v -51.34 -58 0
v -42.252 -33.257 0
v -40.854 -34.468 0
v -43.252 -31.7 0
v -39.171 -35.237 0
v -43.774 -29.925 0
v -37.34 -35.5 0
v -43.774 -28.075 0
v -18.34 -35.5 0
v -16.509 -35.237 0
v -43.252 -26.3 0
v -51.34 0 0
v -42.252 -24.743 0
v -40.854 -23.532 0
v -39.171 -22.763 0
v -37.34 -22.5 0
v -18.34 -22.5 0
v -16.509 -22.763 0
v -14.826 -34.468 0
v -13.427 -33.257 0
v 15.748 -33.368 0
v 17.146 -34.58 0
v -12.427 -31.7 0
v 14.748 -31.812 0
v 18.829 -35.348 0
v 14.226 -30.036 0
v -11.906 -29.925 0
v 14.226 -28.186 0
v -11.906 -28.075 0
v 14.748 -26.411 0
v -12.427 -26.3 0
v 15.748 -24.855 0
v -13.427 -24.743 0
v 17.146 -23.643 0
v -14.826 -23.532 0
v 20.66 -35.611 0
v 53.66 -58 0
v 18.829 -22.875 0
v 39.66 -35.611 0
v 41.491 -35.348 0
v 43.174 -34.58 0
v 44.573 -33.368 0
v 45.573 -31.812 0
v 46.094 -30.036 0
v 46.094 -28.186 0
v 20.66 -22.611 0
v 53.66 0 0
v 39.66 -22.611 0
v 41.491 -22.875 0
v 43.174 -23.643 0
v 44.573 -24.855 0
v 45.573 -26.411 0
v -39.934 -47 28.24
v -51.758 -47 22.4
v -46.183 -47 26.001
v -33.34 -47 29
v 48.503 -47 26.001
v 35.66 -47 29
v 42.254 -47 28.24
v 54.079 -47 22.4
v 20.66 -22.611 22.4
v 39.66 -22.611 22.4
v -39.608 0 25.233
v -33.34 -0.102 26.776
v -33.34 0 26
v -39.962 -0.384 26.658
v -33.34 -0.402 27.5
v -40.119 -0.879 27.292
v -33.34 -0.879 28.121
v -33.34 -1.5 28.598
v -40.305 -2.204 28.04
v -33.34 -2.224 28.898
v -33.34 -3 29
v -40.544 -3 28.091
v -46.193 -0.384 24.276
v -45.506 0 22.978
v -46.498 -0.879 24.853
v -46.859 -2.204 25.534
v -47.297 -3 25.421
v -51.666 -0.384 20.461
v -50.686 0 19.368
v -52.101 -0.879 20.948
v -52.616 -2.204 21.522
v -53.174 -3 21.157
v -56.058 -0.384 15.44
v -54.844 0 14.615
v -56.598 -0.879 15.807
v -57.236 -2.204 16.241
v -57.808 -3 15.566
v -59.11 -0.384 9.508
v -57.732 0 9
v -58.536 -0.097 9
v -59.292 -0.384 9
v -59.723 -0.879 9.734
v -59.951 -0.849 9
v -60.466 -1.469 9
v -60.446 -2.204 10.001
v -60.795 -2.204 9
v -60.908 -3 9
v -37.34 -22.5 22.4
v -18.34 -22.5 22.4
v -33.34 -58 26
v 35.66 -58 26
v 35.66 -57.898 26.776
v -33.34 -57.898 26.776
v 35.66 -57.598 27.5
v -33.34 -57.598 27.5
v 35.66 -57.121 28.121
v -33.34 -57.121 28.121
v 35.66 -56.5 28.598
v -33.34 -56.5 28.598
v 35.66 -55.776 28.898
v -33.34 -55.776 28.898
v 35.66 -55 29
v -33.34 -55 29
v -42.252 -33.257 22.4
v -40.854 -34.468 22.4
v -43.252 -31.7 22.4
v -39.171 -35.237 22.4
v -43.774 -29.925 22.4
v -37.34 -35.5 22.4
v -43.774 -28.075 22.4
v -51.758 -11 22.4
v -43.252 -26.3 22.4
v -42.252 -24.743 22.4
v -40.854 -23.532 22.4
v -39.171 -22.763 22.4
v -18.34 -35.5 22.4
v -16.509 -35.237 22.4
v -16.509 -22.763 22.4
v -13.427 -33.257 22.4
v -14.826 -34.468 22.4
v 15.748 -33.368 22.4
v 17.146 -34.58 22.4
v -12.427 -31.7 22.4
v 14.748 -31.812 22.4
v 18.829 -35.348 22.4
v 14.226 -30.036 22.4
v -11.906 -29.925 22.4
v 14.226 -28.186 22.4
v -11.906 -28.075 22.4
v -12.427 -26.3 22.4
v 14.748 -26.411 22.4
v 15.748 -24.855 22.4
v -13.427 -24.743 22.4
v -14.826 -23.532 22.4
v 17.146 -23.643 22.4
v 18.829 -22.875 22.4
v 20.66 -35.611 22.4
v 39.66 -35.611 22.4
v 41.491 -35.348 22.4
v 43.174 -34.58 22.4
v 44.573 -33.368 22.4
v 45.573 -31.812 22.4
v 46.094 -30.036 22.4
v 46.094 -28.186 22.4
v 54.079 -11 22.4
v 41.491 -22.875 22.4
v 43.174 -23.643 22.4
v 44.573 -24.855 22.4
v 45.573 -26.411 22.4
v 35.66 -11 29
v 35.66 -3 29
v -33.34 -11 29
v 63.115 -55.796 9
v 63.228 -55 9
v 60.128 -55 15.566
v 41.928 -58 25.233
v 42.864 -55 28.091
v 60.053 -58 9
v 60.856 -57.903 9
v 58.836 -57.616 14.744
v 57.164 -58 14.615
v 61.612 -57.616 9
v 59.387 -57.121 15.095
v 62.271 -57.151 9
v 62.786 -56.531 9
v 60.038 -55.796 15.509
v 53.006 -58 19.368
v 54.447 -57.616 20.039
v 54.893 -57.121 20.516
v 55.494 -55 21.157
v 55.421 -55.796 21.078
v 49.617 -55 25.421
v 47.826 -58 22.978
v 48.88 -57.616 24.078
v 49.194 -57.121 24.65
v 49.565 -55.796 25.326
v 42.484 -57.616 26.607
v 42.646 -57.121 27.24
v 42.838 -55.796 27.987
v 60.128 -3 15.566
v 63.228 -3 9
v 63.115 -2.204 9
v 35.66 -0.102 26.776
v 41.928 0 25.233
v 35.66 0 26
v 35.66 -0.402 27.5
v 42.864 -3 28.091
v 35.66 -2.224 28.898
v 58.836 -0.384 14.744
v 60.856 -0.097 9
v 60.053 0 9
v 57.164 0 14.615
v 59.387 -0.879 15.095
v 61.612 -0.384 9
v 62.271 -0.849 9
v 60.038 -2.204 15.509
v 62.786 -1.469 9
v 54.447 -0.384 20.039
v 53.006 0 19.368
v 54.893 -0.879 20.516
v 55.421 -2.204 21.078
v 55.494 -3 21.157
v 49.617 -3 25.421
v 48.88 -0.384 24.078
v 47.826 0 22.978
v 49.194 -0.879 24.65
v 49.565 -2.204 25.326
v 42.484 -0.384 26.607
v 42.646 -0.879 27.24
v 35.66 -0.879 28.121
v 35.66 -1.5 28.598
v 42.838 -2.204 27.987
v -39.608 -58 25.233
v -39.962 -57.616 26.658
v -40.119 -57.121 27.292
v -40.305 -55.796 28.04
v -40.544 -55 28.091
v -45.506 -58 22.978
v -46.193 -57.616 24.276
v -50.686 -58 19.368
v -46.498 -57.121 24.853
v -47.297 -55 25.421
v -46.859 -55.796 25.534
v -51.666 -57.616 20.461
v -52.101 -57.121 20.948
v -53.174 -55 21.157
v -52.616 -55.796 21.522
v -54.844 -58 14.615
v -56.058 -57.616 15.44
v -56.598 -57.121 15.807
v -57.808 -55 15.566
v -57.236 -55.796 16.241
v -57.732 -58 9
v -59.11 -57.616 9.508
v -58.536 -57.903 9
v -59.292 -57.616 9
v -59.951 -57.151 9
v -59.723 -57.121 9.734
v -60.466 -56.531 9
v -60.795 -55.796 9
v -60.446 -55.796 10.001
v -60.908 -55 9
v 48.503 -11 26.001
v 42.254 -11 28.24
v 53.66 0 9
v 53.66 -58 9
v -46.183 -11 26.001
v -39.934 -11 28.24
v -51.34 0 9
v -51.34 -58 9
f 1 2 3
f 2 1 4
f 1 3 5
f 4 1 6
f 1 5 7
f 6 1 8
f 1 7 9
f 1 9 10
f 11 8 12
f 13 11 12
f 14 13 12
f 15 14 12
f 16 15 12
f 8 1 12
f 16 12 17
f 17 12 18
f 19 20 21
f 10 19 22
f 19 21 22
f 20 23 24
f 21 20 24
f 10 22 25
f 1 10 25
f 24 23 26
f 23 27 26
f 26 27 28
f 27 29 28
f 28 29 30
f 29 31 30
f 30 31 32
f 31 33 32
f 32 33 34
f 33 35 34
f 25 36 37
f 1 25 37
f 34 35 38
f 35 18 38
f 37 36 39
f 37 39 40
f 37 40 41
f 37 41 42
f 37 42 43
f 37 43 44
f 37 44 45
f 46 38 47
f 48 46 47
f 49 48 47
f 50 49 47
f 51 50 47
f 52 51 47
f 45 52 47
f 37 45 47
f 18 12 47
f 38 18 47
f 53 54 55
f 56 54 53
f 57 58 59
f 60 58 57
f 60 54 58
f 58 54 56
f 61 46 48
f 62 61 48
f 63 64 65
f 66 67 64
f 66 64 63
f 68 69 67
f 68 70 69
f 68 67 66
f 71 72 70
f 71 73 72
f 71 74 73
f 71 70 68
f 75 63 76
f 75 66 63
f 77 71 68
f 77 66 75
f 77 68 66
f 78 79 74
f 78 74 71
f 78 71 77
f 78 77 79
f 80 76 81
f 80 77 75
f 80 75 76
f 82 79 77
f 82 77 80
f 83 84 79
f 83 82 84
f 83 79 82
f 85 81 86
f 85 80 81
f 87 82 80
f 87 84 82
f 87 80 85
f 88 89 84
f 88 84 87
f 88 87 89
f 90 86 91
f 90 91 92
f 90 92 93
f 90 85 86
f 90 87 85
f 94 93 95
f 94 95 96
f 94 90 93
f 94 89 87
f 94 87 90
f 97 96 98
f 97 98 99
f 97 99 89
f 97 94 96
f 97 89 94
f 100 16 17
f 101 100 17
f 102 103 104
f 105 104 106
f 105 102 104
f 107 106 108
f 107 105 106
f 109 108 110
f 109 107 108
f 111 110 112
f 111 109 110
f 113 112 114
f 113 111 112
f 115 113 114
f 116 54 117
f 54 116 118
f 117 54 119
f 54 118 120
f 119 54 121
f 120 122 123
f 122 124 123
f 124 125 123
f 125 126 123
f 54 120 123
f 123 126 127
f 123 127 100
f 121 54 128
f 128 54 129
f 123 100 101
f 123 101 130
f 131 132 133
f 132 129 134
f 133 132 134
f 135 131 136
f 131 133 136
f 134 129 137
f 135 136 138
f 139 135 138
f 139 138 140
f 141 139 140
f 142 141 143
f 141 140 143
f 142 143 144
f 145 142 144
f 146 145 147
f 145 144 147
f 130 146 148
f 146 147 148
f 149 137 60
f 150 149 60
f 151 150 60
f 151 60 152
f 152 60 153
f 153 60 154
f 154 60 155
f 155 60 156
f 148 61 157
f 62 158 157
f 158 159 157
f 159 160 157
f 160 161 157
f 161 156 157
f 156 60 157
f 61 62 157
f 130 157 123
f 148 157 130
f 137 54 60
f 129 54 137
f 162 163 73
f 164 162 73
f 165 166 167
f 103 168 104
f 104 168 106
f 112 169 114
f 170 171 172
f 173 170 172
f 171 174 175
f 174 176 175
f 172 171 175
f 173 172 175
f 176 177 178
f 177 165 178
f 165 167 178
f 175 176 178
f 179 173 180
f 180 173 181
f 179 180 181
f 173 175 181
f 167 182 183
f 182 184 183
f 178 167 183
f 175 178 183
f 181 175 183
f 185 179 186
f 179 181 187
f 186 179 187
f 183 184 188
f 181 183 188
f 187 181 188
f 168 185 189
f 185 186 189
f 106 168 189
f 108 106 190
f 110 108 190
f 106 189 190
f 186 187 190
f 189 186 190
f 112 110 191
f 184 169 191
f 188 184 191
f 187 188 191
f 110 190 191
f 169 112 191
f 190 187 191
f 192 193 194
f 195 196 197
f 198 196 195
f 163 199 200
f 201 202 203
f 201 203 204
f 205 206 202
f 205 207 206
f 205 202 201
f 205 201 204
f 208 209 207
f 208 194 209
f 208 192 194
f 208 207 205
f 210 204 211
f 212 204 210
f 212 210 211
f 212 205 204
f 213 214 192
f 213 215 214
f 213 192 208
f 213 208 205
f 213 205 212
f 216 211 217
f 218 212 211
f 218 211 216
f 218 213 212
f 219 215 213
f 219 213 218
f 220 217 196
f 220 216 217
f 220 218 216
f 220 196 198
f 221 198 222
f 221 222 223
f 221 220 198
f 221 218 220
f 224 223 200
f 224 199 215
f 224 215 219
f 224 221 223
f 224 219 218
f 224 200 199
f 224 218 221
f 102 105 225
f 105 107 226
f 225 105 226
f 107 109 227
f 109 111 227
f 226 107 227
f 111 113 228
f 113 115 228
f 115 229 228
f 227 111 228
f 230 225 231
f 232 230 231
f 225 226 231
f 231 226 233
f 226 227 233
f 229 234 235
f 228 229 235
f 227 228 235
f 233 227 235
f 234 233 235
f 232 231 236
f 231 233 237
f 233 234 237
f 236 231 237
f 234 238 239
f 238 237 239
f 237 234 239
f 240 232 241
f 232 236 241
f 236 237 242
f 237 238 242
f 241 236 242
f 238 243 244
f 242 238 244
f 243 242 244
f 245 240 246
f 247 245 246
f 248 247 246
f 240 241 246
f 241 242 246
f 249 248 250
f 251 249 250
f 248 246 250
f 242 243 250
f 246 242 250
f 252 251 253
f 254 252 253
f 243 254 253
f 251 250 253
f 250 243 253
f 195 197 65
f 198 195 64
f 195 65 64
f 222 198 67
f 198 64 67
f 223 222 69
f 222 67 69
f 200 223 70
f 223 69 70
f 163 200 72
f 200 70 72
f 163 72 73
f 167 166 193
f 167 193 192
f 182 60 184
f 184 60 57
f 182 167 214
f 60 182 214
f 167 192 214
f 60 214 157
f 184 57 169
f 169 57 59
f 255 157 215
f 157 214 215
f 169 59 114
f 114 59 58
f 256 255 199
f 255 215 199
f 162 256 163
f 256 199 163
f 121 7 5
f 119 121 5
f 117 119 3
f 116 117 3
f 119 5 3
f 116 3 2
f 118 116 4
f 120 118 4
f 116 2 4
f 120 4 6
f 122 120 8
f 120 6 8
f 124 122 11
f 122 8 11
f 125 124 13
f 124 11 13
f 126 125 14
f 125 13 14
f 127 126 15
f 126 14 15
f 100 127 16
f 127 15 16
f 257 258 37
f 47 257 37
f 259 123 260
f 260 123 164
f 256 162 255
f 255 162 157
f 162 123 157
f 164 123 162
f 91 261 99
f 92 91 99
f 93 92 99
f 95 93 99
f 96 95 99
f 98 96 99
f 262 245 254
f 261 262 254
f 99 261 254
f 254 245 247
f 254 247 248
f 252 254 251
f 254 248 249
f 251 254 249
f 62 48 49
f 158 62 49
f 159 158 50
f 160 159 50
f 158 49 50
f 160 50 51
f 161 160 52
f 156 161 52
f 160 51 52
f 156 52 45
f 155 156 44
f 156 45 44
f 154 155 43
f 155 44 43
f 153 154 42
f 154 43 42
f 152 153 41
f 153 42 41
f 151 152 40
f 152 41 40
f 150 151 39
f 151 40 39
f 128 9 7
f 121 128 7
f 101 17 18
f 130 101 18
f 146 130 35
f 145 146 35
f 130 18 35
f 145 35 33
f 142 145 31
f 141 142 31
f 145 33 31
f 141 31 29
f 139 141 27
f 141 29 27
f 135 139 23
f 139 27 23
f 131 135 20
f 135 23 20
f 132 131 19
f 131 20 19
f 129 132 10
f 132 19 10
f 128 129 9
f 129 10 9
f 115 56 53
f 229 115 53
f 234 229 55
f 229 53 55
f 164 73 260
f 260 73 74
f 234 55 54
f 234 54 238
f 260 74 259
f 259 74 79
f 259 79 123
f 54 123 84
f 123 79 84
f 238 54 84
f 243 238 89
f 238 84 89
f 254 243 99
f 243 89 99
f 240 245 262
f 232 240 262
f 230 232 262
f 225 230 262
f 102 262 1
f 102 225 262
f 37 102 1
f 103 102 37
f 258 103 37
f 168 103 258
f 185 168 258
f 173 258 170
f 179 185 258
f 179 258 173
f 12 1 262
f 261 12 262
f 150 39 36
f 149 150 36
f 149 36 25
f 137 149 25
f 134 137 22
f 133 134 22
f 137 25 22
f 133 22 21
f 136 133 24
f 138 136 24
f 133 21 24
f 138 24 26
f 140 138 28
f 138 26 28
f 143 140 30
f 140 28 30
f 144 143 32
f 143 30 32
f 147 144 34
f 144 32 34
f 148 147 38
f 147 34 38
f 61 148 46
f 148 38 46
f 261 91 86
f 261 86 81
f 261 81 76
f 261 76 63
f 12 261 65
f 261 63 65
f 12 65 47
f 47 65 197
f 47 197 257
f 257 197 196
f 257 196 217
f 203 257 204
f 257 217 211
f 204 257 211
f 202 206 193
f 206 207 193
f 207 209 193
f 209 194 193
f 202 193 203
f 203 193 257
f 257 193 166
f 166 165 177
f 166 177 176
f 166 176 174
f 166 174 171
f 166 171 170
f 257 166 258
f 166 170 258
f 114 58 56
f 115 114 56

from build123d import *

# Parameters (mm, degrees)
F1_DEPTH      = 58
F3_DEPTH      = 58.001
F4_W          = 36
F4_H          = 6.6
F5_DEPTH      = 127
F5_DEPTH_BACK = 127
F7_DEPTH      = 29.001
F8_R          = 3
F9_DEPTH      = 25


with BuildPart() as f1:
    # F0 (on Front) → F1 (new body)
    with BuildSketch(Plane.XZ):
        with BuildLine():
            ThreePointArc((-60.907962, 9), (-61.979652, 4.556598), (-62.339865, 0))
            Line((-62.339865, 0), (-51.339865, 0))
            Line((-51.339865, 0), (-51.339865, 9))
            Line((-51.339865, 9), (-60.907962, 9))
        make_face()
        with BuildLine():
            ThreePointArc((-33.339865, 29), (-50.369251, 23.473389), (-60.907962, 9))
            Line((-60.907962, 9), (-51.339865, 9))
            Line((-51.339865, 9), (-51.339865, 0))
            Line((-51.339865, 0), (53.660135, 0))
            Line((53.660135, 0), (53.660135, 9))
            Line((53.660135, 9), (63.228233, 9))
            ThreePointArc((63.228233, 9), (52.689522, 23.473389), (35.660135, 29))
            Line((35.660135, 29), (-33.339865, 29))
        make_face()
        with BuildLine():
            Line((53.660135, 9), (53.660135, 0))
            Line((53.660135, 0), (64.660135, 0))
            ThreePointArc((64.660135, 0), (64.299923, 4.556598), (63.228233, 9))
            Line((63.228233, 9), (53.660135, 9))
        make_face()
    extrude(amount=F1_DEPTH)

    # F2 (on face) → F3 (cut, through all)
    with BuildSketch(Plane.XZ.offset(58)):
        with BuildLine():
            Line((-62.339865, 0), (-51.339865, 0))
            Line((-51.339865, 0), (-51.339865, 9))
            Line((-51.339865, 9), (-60.907962, 9))
            ThreePointArc((-60.907962, 9), (-61.979652, 4.556598), (-62.339865, 0))
        make_face()
        with BuildLine():
            Line((53.660135, 9), (53.660135, 0))
            Line((53.660135, 0), (64.660135, 0))
            ThreePointArc((64.660135, 0), (64.299923, 4.556598), (63.228233, 9))
            Line((63.228233, 9), (53.660135, 9))
        make_face()
    extrude(amount=-F3_DEPTH, mode=Mode.SUBTRACT)

    # F4 (on Right) → F5 (cut, two sides)
    with BuildSketch(Plane.YZ) as f5_sk:
        with Locations((-29, 25.7)):
            Rectangle(F4_W, F4_H)
    extrude(amount=F5_DEPTH, mode=Mode.SUBTRACT)
    extrude(f5_sk.sketch, amount=-F5_DEPTH_BACK, mode=Mode.SUBTRACT)

    # F6 (on face) → F7 (cut, through all)
    with BuildSketch(Plane(origin=(0, 0, 0), x_dir=(1, 0, 0), z_dir=(0, 0, -1))):
        with BuildLine():
            ThreePointArc((-37.339865, 35.5), (-43.839865, 29), (-37.339865, 22.5))
            Line((-37.339865, 22.5), (-18.339865, 22.5))
            ThreePointArc((-18.339865, 22.5), (-11.839865, 29), (-18.339865, 35.5))
            Line((-18.339865, 35.5), (-37.339865, 35.5))
        make_face()
        with BuildLine():
            ThreePointArc((20.660135, 35.611376), (14.160135, 29.111376), (20.660135, 22.611376))
            Line((20.660135, 22.611376), (39.660135, 22.611376))
            ThreePointArc((39.660135, 22.611376), (46.160135, 29.111376), (39.660135, 35.611376))
            Line((39.660135, 35.611376), (20.660135, 35.611376))
        make_face()
    extrude(amount=-F7_DEPTH, mode=Mode.SUBTRACT)

    # F8
    f8_edges = [f1.edges().sort_by_distance(p)[0] for p in [
        (1.160135, -58, 29),
        (1.160135, 0, 29),
    ]]
    fillet(f8_edges, radius=F8_R)

    # F6 (on face) → F9 (cut)
    with BuildSketch(Plane(origin=(0, 0, 0), x_dir=(1, 0, 0), z_dir=(0, 0, -1))):
        with BuildLine():
            ThreePointArc((-37.339865, 35.5), (-43.839865, 29), (-37.339865, 22.5))
            Line((-37.339865, 22.5), (-18.339865, 22.5))
            ThreePointArc((-18.339865, 22.5), (-11.839865, 29), (-18.339865, 35.5))
            Line((-18.339865, 35.5), (-37.339865, 35.5))
        make_face()
        with BuildLine():
            ThreePointArc((20.660135, 35.611376), (14.160135, 29.111376), (20.660135, 22.611376))
            Line((20.660135, 22.611376), (39.660135, 22.611376))
            ThreePointArc((39.660135, 22.611376), (46.160135, 29.111376), (39.660135, 35.611376))
            Line((39.660135, 35.611376), (20.660135, 35.611376))
        make_face()
    extrude(amount=F9_DEPTH, mode=Mode.SUBTRACT)


solid = f1.part
